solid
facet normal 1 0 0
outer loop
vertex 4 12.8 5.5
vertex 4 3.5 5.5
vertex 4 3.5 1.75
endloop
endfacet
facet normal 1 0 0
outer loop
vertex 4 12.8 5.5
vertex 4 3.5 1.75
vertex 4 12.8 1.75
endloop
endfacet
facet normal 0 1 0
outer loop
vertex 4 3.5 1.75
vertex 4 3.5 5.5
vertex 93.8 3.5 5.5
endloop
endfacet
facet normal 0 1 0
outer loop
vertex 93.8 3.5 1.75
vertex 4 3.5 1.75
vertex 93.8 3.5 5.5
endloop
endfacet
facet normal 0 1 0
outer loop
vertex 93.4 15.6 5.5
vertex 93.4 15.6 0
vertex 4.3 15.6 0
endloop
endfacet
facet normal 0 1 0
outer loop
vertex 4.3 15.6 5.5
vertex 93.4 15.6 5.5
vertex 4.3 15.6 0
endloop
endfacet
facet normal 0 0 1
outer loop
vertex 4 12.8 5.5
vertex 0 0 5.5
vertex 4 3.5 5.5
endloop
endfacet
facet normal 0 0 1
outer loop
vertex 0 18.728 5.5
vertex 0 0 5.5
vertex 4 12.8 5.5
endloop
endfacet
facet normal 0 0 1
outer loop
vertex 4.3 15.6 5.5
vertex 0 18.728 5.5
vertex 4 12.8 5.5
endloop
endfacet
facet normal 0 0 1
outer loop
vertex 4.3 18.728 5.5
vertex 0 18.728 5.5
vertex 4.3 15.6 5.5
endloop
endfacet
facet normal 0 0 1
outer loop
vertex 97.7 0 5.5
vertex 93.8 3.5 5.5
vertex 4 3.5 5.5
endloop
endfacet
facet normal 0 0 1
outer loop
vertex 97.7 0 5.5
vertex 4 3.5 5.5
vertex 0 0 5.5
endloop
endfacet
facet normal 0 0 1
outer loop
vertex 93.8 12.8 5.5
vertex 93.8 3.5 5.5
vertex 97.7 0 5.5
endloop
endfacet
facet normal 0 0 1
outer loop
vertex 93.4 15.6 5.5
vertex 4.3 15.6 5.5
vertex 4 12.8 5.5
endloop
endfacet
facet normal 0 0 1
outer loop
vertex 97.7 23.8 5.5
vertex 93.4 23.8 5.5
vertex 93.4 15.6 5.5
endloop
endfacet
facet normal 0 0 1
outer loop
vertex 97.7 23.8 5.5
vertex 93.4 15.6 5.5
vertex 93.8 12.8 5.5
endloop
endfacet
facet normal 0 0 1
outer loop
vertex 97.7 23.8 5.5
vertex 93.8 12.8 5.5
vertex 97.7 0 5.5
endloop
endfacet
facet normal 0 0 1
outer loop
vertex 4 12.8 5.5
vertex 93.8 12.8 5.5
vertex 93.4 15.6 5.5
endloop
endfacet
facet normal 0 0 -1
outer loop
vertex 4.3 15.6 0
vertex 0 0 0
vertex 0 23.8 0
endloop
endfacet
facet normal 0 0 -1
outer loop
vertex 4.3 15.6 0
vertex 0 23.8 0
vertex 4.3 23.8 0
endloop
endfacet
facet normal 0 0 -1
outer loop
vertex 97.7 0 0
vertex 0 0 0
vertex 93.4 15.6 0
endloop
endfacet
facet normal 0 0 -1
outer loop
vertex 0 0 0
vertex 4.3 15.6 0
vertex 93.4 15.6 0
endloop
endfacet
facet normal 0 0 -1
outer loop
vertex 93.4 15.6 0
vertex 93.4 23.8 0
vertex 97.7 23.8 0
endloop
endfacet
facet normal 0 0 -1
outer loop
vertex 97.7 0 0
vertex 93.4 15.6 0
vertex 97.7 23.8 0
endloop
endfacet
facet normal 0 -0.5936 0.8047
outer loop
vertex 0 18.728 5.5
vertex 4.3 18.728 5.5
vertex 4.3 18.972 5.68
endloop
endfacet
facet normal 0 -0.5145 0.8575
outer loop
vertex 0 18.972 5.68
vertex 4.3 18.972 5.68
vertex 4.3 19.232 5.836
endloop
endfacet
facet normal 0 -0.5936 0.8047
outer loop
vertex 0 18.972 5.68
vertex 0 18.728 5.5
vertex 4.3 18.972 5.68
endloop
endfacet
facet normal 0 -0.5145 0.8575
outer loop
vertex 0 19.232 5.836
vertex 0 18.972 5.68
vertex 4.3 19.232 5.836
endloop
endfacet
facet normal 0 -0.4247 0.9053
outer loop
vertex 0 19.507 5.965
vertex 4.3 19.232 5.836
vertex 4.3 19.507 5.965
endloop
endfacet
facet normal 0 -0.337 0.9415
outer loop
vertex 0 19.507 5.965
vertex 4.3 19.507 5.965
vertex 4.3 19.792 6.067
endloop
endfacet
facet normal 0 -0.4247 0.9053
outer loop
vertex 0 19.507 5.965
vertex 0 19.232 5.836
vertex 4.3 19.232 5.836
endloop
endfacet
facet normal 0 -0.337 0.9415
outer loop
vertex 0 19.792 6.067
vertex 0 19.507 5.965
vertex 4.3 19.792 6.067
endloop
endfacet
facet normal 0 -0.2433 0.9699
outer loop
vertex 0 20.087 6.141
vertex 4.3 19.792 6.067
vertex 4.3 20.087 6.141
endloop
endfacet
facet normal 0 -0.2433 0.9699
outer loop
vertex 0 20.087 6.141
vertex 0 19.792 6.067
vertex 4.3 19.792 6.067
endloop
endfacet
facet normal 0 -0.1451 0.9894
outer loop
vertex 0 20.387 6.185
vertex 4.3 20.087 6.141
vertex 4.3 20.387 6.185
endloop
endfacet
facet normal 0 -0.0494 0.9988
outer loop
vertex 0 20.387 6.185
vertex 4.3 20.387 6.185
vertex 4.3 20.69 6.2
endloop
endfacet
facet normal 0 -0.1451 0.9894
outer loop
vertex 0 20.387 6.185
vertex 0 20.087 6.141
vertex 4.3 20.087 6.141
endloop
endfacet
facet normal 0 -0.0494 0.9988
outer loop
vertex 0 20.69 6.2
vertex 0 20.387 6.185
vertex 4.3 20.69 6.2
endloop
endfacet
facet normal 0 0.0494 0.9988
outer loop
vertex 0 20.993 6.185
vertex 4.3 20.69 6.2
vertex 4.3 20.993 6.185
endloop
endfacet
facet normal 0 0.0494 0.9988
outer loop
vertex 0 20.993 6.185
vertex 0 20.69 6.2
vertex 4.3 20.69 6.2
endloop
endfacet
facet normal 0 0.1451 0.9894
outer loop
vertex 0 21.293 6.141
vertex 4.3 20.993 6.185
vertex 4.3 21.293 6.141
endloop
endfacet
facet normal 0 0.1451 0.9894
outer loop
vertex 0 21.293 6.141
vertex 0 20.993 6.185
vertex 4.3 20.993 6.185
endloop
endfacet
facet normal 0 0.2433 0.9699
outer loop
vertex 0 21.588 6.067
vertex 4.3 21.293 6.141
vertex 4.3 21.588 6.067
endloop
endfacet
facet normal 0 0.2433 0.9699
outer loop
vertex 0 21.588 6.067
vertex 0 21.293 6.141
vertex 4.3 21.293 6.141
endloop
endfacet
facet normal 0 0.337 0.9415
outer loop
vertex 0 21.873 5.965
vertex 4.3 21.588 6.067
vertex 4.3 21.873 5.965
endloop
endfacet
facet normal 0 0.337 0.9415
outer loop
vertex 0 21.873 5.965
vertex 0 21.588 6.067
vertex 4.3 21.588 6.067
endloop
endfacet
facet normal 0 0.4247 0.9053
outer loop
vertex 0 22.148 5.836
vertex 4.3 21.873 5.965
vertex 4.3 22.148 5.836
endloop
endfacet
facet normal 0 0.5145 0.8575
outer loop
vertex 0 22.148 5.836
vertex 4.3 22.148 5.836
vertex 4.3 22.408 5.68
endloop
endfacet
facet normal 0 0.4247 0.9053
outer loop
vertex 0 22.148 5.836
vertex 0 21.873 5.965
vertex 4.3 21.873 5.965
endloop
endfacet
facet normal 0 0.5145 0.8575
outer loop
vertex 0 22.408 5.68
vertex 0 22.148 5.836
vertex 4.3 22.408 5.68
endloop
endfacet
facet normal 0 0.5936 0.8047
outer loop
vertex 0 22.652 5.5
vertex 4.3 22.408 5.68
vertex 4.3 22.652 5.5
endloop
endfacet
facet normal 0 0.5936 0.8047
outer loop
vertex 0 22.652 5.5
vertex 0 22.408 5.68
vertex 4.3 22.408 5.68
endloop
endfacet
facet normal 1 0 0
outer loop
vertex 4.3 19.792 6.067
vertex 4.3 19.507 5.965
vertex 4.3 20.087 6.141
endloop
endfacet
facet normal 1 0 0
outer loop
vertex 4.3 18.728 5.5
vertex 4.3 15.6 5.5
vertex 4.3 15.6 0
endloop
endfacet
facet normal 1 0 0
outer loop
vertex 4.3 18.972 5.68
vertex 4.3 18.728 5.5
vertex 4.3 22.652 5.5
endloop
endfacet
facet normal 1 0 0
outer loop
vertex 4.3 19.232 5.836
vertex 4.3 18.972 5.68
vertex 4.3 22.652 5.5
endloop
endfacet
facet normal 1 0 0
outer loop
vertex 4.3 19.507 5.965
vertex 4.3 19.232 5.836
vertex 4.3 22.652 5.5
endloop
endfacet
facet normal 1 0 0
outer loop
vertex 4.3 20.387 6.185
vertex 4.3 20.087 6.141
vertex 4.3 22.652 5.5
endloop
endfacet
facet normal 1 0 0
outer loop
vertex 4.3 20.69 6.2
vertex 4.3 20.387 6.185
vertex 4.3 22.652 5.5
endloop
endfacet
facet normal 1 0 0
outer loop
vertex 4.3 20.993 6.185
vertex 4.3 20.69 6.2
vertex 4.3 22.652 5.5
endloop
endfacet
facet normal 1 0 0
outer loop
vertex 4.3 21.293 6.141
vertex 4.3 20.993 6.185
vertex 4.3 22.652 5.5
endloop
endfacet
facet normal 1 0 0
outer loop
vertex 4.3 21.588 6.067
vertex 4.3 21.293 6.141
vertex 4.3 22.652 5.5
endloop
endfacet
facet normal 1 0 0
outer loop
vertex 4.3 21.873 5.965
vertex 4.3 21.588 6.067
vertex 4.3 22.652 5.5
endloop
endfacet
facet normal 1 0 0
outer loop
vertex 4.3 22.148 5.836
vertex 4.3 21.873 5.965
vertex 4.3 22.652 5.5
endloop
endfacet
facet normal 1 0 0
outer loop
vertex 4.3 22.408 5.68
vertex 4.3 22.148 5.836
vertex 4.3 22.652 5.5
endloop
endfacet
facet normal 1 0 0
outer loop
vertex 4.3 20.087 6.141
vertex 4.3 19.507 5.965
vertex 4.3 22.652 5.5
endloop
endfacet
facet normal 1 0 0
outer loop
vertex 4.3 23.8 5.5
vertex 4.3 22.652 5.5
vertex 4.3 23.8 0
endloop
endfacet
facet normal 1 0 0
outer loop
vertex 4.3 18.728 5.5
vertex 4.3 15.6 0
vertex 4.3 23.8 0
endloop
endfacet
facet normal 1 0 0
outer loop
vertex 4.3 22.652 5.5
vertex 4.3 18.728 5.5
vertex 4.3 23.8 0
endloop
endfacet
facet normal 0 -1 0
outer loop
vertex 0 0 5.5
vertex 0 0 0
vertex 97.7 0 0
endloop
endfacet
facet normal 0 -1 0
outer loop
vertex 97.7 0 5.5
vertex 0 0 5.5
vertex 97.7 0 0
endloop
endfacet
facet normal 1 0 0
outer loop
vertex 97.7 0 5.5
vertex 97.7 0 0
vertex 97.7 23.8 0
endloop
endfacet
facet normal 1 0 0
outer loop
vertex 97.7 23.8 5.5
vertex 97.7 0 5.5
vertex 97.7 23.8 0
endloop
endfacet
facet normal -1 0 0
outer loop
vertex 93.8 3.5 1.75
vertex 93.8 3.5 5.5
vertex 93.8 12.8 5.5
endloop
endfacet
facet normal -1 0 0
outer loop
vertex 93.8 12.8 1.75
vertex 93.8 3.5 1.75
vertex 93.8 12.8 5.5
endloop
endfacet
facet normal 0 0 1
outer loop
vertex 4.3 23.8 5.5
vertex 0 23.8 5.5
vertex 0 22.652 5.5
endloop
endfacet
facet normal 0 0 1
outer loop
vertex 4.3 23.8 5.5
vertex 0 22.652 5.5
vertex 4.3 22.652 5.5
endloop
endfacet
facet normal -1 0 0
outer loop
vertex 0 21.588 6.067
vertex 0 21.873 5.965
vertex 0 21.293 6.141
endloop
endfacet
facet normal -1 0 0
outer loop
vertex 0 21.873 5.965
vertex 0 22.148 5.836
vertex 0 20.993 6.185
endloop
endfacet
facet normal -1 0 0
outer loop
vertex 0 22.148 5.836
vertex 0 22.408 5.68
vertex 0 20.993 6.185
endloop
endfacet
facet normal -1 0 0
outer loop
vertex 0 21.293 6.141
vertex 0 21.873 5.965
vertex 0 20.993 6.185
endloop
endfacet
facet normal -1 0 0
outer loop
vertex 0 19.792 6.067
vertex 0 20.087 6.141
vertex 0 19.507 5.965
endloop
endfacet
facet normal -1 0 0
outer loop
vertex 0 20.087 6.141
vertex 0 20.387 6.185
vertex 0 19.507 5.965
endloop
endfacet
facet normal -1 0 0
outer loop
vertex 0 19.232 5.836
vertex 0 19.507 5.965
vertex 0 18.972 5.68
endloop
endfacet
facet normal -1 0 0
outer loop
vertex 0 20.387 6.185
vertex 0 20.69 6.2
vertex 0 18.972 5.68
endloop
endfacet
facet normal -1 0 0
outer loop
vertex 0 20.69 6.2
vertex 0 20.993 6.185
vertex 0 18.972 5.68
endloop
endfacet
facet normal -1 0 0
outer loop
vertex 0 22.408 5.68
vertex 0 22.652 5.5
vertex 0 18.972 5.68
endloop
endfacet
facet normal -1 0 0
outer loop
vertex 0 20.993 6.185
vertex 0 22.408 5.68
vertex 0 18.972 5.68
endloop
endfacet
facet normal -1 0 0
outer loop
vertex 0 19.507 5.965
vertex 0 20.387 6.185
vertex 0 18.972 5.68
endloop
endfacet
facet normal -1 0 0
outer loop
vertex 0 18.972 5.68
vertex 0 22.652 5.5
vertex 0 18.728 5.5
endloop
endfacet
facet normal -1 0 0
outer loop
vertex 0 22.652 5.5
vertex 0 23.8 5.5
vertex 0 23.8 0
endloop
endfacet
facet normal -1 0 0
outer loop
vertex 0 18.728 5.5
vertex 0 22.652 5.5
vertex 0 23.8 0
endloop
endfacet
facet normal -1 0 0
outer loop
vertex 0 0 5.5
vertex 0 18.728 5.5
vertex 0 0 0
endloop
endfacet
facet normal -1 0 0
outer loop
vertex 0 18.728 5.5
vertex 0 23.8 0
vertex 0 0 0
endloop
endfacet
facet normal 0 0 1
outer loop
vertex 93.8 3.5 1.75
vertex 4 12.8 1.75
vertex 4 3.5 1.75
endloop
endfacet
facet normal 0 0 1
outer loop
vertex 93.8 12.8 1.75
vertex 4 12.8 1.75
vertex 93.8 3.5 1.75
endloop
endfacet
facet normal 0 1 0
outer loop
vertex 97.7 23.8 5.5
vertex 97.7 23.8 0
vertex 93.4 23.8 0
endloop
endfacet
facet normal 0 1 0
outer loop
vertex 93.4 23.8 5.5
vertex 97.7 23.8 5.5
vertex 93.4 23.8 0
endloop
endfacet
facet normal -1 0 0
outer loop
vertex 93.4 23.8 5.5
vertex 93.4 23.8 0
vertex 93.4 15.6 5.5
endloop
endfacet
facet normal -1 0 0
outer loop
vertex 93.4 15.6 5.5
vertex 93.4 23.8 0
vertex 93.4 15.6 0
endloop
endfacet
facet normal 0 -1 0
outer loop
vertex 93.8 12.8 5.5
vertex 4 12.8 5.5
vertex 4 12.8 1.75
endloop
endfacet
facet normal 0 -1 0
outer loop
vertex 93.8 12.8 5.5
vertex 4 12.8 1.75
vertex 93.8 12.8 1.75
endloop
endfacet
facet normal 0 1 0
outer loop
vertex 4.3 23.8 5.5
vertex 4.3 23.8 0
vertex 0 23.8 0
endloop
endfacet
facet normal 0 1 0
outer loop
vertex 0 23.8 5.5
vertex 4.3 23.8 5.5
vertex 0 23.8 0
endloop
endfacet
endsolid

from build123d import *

# Parameters (mm, degrees)
PAD_DEPTH    = 5.5
SKETCH001_W  = 89.8
SKETCH001_H  = 9.3
POCKET_DEPTH = 3.75
SKETCH002_R  = 3.1
PAD001_DEPTH = 4.3


with BuildPart() as part:
    # Sketch → Pad (new body)
    with BuildSketch(Plane.XY):
        Polygon((0, 0), (97.7, 0), (97.7, 23.8), (93.4, 23.8), (93.4, 15.6), (4.3, 15.6), (4.3, 23.8), (0, 23.8), align=None)
    extrude(amount=PAD_DEPTH)

    # Sketch001 (on Face10 of Pad) → Pocket (cut)
    with BuildSketch(Plane.XY.offset(5.5)):
        with Locations((48.9, 8.15)):
            Rectangle(SKETCH001_W, SKETCH001_H)
    extrude(amount=-POCKET_DEPTH, mode=Mode.SUBTRACT)

    # Sketch002 (on Face2 of Pocket) → Pad001 (join)
    with BuildSketch(Plane(origin=(0, 0, 0), x_dir=(0, -1, 0), z_dir=(-1, 0, 0))):
        with Locations((-20.69, 3.1)):
            Circle(SKETCH002_R)
    extrude(amount=-PAD001_DEPTH)


solid = part.part
